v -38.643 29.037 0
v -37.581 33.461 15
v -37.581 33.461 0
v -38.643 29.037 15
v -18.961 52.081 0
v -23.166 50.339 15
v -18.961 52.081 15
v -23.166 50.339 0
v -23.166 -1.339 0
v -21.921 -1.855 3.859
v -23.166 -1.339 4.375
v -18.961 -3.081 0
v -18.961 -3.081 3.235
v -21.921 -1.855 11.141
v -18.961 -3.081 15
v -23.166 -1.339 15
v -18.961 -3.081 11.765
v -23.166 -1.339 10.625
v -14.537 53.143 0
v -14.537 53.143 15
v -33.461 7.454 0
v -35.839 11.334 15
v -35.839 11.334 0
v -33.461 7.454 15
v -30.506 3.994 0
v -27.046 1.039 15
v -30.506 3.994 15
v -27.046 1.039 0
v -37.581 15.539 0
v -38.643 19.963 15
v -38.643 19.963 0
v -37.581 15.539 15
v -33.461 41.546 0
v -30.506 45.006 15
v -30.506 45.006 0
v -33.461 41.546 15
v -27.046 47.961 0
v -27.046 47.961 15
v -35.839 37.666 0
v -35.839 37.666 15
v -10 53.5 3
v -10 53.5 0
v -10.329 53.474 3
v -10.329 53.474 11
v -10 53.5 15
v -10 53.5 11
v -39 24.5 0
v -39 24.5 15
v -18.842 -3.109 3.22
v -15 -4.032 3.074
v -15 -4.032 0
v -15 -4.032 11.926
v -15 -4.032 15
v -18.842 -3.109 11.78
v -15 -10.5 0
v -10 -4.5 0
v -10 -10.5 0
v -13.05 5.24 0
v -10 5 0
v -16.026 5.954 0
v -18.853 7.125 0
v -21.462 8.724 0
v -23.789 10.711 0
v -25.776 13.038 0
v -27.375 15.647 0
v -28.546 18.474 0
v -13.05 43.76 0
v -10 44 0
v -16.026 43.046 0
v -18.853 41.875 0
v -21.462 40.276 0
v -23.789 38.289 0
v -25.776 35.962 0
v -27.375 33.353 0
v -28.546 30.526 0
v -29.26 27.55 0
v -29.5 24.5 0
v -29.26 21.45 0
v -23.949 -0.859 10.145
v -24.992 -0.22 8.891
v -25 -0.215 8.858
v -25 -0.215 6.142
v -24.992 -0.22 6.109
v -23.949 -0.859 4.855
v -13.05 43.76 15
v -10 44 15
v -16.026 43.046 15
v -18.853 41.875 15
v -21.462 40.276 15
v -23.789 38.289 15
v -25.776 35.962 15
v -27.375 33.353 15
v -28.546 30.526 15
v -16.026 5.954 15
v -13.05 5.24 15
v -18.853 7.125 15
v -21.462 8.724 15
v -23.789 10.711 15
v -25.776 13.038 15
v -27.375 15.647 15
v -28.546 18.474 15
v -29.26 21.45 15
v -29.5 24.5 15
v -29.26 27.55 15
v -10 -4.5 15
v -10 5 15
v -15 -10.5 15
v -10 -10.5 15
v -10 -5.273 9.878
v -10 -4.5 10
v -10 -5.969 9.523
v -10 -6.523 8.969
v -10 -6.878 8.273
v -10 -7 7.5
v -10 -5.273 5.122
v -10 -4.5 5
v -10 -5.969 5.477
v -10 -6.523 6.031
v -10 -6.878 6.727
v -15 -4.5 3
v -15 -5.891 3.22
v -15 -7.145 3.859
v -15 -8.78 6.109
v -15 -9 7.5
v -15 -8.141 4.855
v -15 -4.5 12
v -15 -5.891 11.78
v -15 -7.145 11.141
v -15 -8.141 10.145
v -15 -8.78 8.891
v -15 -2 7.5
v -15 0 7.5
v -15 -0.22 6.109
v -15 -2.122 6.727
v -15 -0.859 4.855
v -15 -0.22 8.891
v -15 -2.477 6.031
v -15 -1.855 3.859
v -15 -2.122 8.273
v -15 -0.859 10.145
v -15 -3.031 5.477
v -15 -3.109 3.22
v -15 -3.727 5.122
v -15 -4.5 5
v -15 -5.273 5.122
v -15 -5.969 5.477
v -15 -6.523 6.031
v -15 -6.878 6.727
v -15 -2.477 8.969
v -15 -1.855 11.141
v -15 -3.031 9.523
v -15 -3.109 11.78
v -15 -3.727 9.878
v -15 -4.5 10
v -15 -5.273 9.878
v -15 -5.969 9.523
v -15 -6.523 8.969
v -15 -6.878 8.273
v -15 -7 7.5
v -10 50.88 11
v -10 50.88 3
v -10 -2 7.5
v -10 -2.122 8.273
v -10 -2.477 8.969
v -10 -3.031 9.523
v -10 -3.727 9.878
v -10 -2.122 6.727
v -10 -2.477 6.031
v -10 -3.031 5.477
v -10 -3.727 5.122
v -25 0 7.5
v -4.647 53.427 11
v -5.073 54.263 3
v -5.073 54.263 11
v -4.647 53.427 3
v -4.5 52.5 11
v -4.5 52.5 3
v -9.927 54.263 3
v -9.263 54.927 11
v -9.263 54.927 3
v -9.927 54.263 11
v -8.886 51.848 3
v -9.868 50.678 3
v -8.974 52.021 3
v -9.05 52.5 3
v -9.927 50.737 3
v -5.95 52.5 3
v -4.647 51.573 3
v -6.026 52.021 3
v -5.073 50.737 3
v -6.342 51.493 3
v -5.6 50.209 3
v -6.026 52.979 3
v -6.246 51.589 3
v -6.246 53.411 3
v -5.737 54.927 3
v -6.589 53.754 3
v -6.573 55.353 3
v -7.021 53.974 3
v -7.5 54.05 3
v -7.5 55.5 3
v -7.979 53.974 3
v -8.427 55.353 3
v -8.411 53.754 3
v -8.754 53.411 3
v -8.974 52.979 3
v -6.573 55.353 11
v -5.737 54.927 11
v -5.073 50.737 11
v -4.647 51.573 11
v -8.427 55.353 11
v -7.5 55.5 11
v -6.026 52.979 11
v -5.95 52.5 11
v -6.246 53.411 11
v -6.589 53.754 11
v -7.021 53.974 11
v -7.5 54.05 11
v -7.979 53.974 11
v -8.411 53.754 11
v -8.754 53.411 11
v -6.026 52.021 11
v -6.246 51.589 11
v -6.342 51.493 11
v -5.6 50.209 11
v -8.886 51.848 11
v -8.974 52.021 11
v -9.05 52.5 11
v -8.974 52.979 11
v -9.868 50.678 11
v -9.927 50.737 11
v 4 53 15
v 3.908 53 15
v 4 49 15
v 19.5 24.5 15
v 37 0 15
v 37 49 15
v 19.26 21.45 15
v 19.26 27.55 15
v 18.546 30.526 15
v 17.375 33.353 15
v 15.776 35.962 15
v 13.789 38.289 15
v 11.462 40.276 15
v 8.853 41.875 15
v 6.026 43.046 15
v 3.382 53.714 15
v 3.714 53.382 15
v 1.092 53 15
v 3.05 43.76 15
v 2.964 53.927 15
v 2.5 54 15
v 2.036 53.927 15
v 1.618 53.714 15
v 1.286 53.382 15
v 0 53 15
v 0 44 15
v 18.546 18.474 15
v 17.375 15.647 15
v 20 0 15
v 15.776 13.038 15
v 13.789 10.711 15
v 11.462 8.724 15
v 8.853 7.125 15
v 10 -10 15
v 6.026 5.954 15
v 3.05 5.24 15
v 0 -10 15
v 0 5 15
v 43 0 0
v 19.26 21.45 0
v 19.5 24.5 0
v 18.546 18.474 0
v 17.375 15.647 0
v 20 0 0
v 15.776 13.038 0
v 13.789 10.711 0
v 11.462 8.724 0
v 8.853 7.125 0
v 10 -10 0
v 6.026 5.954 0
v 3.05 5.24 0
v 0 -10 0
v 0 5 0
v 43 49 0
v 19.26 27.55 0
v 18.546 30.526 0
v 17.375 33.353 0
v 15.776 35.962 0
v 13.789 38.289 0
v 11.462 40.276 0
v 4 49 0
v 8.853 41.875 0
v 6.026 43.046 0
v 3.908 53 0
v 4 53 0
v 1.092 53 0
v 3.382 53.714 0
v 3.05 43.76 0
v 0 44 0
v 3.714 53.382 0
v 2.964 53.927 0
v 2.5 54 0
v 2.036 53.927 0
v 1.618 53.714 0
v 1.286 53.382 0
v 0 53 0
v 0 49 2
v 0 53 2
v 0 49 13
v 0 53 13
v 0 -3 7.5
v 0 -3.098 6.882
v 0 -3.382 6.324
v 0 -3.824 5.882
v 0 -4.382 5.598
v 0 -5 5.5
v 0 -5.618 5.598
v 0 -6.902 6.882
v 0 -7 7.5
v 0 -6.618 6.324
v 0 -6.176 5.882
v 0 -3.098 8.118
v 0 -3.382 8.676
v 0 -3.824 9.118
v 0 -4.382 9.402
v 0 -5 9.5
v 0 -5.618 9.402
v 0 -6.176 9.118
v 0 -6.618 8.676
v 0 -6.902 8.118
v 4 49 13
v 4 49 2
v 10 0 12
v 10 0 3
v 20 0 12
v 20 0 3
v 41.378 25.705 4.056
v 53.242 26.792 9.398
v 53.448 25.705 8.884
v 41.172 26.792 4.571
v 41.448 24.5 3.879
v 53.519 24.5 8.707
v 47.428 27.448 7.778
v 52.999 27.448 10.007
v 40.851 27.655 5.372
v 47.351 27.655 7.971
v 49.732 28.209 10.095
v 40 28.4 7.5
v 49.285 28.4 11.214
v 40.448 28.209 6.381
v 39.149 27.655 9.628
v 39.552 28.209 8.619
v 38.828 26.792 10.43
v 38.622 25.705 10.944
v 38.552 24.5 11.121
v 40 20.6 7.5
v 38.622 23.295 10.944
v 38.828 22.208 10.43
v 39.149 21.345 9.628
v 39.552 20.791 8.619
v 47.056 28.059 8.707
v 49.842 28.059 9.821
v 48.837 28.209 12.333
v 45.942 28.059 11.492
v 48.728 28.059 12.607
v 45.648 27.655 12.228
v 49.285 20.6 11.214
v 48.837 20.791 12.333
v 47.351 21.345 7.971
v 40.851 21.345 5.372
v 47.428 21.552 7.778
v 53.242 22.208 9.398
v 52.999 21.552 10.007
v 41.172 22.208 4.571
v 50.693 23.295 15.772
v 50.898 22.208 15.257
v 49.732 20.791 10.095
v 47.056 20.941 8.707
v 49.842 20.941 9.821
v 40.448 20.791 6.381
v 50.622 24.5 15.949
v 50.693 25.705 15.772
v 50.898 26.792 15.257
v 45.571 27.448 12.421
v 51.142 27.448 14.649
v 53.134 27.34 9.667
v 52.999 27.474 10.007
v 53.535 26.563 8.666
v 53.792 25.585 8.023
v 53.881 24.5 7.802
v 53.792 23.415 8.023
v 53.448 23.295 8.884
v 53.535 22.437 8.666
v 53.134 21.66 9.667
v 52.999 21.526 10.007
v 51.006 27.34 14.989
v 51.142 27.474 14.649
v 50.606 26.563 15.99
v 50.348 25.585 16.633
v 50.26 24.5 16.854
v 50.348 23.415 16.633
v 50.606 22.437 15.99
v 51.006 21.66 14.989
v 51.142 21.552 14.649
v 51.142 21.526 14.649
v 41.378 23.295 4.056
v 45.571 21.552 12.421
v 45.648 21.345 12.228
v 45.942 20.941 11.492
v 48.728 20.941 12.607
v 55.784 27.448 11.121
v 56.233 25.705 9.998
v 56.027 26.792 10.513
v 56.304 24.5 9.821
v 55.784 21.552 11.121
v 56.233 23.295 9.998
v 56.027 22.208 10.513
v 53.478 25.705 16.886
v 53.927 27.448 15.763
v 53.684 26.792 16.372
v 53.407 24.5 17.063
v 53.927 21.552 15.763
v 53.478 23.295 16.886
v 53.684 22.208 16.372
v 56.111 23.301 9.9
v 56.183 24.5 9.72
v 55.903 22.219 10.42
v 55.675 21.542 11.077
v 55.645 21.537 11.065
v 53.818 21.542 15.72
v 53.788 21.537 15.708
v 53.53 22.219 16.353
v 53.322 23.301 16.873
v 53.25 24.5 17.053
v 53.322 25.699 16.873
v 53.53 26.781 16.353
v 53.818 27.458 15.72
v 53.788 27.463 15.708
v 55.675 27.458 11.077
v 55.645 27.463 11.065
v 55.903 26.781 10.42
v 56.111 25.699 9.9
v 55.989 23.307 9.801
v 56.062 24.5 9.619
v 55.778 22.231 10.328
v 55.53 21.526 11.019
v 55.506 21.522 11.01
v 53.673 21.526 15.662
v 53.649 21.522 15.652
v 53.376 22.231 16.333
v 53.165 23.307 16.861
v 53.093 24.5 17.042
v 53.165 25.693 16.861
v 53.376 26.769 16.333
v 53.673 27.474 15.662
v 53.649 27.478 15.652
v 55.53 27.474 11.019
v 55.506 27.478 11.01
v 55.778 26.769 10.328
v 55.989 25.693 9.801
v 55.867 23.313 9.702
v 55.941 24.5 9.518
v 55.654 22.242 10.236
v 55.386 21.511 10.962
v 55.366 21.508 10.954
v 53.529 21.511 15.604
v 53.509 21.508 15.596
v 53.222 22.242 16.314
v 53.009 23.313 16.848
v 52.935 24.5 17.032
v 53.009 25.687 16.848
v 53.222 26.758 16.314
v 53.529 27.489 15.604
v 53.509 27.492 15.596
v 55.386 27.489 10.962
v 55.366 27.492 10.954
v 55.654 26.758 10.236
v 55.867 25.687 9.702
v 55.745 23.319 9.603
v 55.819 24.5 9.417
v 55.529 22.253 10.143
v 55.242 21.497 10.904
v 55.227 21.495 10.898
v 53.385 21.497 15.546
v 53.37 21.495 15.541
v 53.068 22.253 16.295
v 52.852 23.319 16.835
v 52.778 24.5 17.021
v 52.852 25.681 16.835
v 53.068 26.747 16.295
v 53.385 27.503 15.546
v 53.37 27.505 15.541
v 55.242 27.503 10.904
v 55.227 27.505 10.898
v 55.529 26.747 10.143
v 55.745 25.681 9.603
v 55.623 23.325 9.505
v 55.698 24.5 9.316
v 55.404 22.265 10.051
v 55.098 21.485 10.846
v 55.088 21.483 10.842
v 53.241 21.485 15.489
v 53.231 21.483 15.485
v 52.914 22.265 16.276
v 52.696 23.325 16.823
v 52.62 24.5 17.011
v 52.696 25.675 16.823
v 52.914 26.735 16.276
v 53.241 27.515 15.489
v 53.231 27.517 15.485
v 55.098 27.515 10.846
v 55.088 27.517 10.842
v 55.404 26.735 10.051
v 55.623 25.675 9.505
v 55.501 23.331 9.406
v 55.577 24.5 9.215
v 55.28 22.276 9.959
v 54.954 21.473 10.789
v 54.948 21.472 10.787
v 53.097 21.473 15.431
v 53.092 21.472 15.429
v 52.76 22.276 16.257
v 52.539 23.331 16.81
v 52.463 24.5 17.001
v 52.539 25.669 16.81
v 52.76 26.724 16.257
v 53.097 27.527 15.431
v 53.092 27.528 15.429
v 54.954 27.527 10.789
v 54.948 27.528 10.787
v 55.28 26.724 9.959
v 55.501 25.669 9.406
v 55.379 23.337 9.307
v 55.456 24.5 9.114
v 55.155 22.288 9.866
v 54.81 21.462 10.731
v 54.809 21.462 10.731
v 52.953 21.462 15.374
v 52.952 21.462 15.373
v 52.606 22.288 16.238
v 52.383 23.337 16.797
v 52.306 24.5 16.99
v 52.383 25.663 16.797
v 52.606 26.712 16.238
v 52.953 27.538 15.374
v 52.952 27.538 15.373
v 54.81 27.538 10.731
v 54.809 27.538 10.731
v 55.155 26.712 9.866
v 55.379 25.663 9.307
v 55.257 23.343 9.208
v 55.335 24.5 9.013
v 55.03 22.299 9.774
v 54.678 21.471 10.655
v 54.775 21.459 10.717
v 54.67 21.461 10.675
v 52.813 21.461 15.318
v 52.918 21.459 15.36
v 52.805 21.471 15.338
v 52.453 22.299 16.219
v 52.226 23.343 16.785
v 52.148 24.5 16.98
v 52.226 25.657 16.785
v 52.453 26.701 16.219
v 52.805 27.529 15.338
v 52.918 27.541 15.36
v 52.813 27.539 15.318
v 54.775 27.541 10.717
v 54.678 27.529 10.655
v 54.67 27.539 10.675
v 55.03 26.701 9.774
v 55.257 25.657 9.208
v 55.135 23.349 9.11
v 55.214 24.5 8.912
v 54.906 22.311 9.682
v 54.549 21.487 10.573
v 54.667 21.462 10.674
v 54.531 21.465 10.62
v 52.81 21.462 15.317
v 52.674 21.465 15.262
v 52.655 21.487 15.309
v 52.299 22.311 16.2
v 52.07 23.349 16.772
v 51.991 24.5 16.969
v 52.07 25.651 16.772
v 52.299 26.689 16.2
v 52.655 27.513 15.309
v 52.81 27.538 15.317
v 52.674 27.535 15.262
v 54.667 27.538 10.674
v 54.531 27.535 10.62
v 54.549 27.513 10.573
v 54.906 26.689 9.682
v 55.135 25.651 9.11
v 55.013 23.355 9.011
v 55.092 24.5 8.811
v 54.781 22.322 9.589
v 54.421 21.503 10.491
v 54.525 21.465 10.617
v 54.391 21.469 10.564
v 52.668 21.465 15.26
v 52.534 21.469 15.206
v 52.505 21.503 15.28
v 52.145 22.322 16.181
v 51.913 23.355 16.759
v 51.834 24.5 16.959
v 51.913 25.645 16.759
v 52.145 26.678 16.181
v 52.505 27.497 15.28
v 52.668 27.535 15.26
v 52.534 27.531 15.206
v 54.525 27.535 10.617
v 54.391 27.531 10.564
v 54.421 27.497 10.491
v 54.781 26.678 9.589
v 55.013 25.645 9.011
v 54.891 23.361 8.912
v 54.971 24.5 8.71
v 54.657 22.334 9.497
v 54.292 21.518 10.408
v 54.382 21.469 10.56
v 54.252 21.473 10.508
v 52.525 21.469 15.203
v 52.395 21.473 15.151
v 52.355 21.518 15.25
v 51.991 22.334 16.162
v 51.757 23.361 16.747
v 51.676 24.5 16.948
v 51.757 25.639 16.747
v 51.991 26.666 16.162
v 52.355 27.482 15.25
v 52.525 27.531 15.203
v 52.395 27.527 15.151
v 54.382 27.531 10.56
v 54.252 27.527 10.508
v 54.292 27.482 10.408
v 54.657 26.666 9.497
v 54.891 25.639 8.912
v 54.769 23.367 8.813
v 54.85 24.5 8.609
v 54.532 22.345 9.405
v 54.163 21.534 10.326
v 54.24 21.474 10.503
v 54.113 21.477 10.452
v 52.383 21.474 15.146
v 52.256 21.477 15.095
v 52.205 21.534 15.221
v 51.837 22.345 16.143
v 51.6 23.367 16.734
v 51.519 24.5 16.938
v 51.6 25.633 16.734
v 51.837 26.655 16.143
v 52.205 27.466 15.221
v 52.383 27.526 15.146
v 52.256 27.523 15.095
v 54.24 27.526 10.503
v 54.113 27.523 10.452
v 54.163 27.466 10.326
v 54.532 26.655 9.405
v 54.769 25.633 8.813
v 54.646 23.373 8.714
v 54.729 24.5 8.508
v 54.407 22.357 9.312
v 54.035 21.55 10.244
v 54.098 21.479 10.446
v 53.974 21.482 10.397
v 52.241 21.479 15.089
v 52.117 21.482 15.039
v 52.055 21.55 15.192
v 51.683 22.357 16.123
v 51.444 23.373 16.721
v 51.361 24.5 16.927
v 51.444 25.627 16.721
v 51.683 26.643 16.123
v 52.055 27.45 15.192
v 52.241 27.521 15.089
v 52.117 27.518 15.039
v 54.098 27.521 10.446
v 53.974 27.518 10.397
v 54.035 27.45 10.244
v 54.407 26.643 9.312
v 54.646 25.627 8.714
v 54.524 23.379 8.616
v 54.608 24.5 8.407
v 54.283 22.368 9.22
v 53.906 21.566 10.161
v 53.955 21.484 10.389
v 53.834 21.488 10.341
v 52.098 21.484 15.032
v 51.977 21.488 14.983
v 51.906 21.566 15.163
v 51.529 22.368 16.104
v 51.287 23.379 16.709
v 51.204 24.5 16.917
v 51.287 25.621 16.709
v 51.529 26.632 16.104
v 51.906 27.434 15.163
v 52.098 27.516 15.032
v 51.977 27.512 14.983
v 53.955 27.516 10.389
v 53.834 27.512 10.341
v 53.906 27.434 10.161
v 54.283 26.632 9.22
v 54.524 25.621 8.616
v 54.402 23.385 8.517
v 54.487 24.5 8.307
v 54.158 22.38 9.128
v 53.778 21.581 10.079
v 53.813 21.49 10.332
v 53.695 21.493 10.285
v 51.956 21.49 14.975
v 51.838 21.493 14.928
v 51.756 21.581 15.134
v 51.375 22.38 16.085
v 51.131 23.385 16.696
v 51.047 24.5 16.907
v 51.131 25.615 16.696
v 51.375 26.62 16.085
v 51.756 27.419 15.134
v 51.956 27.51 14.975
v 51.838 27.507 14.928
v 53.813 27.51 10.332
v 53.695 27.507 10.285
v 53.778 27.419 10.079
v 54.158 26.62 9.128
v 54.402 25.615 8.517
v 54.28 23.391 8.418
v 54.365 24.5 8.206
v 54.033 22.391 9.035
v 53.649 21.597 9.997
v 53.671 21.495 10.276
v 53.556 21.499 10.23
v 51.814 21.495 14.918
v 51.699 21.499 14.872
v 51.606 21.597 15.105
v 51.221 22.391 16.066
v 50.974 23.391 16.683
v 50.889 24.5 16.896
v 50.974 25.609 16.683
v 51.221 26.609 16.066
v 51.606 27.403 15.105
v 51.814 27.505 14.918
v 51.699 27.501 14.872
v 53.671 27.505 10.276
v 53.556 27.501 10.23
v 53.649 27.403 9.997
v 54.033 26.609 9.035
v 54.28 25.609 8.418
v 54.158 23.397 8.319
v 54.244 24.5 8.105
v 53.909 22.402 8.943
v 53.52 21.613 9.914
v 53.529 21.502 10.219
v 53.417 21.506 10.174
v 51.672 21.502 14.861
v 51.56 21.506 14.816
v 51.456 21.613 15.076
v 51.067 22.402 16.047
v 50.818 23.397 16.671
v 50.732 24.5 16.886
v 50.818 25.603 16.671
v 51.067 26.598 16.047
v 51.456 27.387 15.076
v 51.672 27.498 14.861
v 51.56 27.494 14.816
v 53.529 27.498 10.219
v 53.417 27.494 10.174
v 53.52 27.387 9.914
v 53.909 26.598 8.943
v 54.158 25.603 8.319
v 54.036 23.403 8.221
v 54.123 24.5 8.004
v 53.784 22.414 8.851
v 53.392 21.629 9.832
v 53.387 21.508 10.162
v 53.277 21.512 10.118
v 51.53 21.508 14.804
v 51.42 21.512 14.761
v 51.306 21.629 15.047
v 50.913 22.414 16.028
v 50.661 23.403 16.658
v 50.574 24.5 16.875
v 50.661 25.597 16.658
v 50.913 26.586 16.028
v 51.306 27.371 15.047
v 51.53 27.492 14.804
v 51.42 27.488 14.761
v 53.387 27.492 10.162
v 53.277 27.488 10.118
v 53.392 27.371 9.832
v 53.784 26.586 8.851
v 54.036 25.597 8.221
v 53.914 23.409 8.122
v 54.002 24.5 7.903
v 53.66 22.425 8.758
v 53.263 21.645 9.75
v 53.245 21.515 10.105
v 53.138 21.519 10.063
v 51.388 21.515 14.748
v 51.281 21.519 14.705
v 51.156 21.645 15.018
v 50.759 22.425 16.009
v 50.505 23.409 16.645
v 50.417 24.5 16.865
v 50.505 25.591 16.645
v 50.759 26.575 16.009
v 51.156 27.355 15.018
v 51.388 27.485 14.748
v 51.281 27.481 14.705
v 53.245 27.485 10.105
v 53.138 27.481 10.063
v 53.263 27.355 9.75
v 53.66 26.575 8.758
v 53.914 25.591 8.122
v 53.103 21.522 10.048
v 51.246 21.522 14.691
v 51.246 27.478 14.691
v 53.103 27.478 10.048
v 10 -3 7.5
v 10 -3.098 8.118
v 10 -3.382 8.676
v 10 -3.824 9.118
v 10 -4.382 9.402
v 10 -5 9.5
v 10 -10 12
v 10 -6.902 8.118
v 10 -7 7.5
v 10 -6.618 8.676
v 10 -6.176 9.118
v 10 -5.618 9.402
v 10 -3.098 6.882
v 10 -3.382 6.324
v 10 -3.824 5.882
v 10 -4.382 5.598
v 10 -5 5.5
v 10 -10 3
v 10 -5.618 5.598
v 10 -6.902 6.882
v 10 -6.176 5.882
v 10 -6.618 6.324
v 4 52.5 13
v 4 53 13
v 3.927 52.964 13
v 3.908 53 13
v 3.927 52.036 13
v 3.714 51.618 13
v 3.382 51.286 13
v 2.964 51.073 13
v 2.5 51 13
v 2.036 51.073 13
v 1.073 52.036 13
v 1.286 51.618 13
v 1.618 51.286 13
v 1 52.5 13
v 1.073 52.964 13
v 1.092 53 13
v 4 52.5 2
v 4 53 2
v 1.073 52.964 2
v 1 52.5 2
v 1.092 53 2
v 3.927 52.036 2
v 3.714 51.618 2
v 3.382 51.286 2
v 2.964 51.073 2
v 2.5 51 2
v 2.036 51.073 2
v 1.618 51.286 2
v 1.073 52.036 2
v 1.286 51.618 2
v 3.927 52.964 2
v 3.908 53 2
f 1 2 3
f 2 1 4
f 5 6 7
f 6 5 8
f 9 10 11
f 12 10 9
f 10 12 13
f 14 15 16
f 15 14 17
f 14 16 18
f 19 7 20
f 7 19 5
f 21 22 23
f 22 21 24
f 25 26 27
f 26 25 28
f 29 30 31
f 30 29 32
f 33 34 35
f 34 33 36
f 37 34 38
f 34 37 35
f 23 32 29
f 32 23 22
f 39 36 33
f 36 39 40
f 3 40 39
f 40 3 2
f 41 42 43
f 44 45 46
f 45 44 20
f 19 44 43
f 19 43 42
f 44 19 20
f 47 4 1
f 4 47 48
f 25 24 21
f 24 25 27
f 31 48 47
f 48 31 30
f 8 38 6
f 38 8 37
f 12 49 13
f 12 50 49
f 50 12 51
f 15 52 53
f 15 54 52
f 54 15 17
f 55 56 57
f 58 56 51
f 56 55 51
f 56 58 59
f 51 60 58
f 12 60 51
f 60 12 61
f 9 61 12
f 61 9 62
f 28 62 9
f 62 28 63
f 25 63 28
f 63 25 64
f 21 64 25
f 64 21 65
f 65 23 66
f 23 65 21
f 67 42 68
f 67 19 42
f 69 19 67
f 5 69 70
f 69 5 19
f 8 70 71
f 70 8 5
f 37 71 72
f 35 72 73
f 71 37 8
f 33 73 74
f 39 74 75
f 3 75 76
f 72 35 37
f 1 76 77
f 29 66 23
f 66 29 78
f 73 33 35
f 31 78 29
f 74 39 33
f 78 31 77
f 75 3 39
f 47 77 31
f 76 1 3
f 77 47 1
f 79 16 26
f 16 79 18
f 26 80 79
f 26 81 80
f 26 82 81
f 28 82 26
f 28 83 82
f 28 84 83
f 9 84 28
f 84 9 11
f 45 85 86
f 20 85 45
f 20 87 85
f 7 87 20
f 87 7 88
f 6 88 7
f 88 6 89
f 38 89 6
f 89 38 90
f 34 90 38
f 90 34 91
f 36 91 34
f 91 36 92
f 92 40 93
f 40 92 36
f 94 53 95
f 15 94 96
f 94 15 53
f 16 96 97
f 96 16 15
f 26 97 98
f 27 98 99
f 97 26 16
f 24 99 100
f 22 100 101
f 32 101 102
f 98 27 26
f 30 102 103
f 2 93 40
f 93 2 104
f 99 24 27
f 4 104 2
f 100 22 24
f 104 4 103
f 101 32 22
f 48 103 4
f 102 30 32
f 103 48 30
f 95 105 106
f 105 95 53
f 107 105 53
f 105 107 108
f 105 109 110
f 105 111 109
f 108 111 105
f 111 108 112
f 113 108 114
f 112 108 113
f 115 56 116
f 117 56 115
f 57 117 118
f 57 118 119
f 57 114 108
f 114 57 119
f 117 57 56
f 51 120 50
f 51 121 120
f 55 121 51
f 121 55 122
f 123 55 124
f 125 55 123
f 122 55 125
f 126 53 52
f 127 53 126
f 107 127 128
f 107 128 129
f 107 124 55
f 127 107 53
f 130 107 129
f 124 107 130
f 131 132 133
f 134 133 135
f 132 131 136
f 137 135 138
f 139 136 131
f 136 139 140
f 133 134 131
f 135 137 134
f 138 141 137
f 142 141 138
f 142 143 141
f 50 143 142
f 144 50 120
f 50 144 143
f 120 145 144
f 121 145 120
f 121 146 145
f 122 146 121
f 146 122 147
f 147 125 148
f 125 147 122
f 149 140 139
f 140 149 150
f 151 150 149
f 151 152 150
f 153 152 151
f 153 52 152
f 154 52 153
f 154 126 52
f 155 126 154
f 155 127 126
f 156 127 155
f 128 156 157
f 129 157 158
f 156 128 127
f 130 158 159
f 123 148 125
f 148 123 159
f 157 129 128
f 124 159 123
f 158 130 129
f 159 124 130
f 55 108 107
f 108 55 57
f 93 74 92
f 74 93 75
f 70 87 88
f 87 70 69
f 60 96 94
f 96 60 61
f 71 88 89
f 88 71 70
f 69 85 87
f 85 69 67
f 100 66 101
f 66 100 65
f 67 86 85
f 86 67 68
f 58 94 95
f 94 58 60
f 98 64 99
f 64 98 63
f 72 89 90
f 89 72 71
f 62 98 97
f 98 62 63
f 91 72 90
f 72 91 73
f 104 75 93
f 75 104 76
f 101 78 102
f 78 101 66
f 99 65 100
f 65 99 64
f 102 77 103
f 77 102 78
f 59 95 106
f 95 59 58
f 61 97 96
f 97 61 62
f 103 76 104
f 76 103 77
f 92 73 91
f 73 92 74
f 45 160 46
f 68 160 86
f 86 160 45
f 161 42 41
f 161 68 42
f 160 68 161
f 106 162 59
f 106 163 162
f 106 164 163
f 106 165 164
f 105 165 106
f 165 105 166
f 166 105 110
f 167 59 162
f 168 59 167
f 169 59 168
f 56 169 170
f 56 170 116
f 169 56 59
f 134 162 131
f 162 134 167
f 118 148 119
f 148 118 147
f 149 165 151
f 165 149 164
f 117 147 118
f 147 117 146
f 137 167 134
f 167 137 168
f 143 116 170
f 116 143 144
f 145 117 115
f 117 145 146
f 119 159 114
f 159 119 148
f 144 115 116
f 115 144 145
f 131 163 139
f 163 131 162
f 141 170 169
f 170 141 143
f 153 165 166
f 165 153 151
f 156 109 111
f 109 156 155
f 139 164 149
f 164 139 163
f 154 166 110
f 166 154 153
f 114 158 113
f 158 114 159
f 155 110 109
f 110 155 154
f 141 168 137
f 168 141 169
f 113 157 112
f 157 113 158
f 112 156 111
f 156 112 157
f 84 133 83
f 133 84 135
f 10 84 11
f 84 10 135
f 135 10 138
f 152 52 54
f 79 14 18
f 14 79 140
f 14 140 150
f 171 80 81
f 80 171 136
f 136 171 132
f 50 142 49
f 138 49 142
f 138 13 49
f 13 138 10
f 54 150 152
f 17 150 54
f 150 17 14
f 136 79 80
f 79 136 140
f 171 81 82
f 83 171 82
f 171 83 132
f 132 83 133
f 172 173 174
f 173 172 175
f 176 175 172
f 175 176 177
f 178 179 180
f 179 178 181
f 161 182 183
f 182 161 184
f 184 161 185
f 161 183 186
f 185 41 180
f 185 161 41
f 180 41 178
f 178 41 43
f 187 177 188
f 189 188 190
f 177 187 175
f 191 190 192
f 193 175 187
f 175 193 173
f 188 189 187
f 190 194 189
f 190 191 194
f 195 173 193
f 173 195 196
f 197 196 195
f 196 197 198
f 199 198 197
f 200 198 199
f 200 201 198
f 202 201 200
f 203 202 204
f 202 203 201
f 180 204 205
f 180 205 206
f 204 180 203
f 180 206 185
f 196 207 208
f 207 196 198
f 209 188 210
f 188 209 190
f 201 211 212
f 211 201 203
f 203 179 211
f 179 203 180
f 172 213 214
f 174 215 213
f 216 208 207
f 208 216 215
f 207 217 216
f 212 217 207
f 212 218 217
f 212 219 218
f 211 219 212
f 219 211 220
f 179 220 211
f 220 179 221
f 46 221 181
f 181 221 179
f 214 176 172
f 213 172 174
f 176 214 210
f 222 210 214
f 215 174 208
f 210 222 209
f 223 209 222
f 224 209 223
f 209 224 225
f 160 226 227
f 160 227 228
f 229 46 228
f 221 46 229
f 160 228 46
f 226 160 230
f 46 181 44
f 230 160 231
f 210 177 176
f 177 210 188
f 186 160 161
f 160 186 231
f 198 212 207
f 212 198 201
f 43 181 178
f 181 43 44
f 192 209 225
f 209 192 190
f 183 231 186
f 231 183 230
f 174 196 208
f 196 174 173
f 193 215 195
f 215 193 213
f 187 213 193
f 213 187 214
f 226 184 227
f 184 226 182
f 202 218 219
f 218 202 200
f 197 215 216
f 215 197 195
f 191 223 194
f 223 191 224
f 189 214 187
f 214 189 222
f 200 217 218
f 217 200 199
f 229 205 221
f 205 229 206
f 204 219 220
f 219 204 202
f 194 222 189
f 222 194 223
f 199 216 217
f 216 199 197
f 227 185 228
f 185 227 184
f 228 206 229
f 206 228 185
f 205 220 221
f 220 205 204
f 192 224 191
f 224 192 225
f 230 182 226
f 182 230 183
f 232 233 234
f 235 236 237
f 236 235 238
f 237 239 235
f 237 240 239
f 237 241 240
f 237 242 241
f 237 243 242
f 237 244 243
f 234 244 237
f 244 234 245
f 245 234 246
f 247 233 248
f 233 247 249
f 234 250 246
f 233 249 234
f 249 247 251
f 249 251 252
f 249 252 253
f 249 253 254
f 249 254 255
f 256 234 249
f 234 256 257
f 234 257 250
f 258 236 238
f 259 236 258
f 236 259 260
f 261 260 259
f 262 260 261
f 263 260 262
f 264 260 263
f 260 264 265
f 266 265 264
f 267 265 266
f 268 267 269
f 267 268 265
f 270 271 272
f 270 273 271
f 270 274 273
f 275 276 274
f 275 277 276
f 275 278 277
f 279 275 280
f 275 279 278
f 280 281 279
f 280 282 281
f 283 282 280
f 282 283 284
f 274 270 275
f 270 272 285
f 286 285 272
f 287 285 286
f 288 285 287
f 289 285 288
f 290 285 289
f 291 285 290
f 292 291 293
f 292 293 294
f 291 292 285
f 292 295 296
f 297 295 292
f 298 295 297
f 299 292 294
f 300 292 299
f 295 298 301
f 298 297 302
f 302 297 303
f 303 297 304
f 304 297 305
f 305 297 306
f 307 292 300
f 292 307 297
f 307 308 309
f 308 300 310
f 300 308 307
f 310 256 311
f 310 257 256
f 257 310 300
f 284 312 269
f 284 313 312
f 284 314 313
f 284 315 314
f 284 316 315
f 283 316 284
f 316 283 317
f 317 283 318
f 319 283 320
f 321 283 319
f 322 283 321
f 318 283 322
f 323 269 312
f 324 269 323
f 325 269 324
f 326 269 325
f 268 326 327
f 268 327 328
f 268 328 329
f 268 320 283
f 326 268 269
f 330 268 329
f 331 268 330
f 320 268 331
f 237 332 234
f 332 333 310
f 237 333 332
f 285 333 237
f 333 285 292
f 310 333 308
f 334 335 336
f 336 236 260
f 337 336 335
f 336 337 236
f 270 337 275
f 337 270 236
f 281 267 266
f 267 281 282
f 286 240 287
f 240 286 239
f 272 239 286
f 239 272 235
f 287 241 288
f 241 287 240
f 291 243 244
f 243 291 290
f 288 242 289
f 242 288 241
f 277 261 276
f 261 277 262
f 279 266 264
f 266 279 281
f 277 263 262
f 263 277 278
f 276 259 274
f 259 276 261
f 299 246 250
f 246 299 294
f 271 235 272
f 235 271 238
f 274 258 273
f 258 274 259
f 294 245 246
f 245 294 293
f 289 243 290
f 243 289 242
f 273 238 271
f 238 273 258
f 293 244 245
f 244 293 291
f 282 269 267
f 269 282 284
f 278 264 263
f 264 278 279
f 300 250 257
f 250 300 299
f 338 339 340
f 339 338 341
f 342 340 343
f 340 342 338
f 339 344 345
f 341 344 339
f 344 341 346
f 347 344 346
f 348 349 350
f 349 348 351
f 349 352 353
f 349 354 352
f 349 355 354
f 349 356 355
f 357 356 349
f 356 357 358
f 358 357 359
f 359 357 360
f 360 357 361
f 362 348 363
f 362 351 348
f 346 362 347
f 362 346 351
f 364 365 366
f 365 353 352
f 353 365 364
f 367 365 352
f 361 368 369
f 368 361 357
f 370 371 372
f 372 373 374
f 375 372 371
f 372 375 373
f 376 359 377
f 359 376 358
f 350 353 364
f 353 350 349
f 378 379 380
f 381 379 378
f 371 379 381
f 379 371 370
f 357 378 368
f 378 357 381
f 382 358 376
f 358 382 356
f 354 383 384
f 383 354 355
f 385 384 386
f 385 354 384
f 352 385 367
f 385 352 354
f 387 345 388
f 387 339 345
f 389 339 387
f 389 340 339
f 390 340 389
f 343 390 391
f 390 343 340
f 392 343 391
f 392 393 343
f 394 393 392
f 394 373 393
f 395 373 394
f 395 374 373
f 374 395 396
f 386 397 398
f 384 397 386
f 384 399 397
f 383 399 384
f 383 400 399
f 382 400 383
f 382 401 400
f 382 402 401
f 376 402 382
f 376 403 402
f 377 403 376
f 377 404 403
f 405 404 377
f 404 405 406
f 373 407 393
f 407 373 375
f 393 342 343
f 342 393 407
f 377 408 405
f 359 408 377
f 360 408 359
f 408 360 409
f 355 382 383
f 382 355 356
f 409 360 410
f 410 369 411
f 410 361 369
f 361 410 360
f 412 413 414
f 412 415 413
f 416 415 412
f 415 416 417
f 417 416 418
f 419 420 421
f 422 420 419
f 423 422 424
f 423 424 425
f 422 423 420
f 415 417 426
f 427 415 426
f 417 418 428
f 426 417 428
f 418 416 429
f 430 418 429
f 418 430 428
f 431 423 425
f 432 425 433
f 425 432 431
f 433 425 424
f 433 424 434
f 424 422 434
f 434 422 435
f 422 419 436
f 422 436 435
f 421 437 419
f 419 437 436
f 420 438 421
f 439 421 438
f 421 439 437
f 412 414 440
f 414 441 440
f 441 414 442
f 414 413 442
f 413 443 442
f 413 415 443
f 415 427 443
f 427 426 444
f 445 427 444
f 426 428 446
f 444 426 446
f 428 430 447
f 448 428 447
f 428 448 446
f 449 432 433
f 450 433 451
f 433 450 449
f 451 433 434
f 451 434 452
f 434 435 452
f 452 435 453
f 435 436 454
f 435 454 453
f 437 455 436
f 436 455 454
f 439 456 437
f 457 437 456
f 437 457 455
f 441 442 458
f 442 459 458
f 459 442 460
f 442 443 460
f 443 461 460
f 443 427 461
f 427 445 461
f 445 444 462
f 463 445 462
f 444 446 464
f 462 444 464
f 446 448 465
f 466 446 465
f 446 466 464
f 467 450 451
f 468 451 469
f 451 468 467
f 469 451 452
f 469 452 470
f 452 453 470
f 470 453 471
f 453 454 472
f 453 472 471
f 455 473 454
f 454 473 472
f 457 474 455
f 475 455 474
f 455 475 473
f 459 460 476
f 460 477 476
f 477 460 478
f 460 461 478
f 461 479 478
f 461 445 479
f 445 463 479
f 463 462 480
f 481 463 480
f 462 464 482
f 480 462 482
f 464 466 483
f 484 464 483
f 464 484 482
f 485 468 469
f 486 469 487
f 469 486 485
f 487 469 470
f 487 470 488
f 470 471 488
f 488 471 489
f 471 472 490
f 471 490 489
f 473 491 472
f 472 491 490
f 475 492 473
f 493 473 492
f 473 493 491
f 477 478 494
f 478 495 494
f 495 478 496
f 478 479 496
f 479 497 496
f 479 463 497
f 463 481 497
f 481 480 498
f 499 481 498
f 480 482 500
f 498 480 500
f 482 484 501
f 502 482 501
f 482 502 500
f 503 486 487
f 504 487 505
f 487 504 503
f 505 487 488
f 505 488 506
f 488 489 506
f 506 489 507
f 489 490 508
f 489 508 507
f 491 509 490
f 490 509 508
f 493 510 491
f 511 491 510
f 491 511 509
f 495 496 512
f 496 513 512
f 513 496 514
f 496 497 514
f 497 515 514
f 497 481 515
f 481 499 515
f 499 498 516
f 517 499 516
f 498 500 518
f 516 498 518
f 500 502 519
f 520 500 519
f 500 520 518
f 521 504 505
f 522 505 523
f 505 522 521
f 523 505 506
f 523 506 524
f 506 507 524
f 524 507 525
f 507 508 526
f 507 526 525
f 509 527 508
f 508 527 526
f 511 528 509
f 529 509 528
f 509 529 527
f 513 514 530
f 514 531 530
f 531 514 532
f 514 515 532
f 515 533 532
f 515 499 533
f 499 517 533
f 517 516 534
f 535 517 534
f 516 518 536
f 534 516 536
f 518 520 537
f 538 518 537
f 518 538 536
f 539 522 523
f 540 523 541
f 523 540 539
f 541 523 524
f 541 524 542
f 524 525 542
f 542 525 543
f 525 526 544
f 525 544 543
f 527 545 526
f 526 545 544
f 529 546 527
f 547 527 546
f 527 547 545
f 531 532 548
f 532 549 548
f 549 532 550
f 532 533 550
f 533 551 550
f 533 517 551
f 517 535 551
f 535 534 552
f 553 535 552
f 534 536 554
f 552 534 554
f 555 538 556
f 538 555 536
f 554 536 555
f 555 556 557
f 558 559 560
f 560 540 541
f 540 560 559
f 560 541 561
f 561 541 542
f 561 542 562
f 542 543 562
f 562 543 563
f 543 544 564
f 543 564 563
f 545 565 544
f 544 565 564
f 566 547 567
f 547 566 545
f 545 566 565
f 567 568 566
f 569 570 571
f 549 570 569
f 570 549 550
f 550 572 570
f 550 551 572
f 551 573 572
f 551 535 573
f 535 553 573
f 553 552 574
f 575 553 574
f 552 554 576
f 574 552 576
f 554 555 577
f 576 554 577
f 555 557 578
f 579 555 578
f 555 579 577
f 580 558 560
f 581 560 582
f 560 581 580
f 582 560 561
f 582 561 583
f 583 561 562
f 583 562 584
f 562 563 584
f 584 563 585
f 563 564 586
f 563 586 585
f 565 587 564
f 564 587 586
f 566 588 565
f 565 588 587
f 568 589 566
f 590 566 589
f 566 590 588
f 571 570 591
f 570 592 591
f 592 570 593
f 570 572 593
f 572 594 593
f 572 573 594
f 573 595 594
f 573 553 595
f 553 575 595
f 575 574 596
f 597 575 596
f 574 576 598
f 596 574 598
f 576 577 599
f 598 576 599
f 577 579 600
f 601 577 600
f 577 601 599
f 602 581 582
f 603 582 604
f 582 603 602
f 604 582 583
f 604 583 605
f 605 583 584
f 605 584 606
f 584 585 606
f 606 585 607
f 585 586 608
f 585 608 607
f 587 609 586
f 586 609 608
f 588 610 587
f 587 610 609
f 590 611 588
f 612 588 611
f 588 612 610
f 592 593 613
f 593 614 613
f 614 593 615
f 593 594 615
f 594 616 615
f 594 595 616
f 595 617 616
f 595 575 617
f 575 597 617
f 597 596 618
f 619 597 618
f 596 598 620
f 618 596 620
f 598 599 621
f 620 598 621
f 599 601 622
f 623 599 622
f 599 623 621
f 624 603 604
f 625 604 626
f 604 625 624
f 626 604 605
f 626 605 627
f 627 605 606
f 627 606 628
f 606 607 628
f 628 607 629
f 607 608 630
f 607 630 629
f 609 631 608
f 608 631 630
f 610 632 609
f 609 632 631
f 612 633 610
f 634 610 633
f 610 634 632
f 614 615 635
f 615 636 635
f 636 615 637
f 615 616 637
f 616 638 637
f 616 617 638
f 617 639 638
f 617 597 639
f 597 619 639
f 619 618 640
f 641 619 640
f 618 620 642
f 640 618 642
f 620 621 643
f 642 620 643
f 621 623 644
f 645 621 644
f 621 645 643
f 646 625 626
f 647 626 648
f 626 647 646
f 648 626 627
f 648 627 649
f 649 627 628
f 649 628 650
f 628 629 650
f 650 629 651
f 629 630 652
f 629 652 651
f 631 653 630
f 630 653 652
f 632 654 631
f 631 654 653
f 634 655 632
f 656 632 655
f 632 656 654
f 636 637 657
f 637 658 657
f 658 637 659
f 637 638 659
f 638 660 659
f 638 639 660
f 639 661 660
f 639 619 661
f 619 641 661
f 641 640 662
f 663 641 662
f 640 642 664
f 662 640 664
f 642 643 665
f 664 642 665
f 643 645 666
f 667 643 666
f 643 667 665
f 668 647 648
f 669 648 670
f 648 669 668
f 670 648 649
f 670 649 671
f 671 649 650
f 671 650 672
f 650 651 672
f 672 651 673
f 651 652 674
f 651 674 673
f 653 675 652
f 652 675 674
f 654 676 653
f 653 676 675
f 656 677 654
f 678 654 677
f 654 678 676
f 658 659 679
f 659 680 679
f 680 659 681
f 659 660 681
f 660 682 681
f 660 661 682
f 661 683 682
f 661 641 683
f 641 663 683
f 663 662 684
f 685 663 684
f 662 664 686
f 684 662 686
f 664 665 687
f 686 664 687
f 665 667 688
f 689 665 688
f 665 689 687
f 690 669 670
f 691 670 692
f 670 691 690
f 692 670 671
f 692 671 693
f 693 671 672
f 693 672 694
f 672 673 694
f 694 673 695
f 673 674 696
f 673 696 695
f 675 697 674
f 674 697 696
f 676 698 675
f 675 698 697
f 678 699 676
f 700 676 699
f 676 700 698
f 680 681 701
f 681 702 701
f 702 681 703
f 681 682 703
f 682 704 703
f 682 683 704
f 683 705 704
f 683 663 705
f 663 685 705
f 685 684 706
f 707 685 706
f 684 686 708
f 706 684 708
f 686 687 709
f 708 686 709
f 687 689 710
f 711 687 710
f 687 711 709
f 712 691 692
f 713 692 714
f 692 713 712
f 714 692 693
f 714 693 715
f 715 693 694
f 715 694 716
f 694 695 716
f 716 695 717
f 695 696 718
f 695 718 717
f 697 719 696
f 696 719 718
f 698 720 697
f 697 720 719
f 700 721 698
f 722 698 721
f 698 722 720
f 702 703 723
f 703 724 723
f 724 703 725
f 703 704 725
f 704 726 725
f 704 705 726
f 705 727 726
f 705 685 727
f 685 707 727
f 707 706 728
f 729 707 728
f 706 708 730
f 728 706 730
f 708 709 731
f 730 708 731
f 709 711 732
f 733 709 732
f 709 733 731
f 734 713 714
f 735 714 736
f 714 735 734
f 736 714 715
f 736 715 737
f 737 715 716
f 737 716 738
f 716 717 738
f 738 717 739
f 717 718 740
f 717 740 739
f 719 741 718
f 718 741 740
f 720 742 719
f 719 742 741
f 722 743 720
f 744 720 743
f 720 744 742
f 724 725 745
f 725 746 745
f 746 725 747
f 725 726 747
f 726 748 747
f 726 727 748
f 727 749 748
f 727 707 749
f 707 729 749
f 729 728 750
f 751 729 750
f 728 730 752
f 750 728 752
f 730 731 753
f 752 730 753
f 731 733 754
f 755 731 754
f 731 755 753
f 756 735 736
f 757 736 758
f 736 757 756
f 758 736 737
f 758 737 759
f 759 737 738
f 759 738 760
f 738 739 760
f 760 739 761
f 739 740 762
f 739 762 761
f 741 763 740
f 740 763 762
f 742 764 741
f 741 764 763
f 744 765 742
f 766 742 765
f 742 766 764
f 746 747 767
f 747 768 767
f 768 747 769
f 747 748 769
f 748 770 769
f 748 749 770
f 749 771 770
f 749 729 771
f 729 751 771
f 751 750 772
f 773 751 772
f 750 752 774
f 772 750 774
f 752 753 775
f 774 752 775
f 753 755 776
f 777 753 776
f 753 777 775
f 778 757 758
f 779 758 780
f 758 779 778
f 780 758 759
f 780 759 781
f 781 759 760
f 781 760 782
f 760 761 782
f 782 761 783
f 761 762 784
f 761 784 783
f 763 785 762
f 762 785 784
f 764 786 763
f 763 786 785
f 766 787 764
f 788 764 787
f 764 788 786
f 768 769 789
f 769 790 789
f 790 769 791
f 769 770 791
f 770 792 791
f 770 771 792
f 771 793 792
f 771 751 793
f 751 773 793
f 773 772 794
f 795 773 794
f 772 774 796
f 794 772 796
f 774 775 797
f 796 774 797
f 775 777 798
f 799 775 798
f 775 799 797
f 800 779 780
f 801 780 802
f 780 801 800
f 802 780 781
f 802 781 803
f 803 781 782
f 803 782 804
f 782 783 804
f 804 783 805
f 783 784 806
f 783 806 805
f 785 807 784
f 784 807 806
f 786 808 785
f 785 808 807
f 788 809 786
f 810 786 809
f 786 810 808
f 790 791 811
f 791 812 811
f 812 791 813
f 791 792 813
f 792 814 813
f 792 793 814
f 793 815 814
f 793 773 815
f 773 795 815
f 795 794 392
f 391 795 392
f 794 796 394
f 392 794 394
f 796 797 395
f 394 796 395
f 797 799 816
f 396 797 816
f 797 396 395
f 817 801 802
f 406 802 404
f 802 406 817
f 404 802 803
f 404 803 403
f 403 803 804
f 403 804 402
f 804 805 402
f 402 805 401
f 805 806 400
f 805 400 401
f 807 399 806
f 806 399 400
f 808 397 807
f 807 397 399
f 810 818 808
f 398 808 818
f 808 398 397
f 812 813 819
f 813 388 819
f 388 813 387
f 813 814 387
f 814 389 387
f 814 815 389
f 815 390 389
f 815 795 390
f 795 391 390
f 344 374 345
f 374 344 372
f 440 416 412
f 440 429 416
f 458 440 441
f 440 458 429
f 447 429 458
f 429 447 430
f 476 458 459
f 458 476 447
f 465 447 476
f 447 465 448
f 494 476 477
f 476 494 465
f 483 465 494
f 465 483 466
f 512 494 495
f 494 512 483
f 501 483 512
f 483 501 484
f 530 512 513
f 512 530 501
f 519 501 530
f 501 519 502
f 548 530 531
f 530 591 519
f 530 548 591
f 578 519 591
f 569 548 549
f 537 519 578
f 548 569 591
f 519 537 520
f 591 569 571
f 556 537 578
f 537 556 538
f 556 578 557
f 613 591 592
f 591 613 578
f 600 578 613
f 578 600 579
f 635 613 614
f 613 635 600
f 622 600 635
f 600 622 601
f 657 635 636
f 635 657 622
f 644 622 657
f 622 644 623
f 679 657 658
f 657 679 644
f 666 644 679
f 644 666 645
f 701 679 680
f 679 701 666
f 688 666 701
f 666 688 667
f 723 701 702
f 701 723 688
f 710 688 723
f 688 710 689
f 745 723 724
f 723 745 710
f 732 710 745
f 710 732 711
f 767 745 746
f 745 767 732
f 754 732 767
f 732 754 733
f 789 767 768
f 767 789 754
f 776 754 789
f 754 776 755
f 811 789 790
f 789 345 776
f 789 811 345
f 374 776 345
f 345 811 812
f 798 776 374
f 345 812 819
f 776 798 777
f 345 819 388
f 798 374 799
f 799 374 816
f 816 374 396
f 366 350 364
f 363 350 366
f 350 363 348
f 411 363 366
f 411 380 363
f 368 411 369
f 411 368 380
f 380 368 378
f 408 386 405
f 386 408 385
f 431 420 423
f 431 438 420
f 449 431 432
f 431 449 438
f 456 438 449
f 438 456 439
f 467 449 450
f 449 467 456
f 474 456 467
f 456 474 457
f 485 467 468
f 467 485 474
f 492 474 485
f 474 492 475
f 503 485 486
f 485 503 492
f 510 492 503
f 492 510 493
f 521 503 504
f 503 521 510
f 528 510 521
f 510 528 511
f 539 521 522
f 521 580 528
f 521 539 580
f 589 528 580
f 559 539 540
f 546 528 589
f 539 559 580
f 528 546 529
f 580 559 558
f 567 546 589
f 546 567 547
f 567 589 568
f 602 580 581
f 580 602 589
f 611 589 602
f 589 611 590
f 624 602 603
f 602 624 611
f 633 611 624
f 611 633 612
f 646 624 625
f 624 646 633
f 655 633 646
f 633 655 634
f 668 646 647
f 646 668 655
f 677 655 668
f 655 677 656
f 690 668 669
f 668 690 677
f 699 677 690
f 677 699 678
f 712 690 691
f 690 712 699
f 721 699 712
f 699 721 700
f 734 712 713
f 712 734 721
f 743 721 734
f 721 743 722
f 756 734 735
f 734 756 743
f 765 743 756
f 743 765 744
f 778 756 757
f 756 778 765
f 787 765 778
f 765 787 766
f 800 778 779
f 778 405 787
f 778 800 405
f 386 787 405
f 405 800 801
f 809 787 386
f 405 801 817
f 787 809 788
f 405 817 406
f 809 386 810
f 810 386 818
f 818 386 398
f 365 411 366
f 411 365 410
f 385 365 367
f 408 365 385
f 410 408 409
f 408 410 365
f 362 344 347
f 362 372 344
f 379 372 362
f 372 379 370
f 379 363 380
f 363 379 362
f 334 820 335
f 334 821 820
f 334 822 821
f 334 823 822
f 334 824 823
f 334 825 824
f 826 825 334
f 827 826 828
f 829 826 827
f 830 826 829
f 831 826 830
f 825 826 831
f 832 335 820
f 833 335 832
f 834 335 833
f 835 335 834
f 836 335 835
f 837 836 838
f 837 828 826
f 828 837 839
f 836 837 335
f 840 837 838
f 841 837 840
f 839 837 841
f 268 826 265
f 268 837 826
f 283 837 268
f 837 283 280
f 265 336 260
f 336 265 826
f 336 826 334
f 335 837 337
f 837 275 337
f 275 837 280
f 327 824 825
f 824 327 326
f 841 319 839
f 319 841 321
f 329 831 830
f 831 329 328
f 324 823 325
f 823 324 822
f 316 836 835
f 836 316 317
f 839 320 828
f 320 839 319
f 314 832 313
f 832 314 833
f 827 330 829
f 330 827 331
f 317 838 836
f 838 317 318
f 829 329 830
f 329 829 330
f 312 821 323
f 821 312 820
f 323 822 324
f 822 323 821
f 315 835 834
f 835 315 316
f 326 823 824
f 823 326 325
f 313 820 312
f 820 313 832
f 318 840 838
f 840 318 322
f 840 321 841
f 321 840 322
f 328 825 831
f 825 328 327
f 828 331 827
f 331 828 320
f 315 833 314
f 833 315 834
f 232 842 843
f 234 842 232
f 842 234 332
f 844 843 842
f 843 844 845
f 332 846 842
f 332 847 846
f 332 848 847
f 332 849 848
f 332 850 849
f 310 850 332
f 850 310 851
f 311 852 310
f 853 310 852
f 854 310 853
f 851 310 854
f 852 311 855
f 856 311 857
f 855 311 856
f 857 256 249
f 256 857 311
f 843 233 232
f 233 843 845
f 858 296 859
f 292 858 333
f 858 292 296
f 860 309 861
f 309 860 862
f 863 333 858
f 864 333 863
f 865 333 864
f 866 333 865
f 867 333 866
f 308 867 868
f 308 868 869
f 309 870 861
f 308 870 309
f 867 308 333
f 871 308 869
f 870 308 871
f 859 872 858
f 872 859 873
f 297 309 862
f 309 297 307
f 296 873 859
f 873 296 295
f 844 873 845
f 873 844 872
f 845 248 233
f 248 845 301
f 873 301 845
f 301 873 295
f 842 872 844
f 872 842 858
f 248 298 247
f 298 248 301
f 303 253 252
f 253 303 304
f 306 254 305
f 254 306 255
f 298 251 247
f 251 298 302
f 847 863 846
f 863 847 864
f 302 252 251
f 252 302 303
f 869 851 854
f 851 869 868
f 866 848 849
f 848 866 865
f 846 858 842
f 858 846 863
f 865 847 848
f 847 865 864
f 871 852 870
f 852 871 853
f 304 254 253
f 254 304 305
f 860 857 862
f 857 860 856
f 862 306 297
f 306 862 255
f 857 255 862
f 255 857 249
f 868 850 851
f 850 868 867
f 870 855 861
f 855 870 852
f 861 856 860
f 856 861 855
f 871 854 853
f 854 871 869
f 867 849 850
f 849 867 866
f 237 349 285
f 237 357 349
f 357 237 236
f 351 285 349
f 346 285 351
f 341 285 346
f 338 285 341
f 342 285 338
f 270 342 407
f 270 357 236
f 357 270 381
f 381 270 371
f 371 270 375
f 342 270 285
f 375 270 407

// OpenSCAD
// file: Triangles.scad
/*
Triangles.scad
 Author: Tim Koopman
 https://github.com/tkoopman/Delta-Diamond/blob/master/OpenSCAD/Triangles.scad

         angleCA
           /|\
        a / H \ c
         /  |  \
 angleAB ------- angleBC
            b

Standard Parameters
	center: true/false
		If true same as centerXYZ = [true, true, true]

	centerXYZ: Vector of 3 true/false values [CenterX, CenterY, CenterZ]
		center must be left undef

	height: The 3D height of the Triangle. Ignored if heights defined

	heights: Vector of 3 height values heights @ [angleAB, angleBC, angleCA]
		If CenterZ is true each height will be centered individually, this means
		the shape will be different depending on CenterZ. Most times you will want
		CenterZ to be true to get the shape most people want.
*/

/* 
Triangle
	a: Length of side a
	b: Length of side b
	angle: angle at point angleAB
*/
module Triangle(
			a, b, angle, height=1, heights=undef,
			center=undef, centerXYZ=[false,false,false])
{
	// Calculate Heights at each point
	heightAB = ((heights==undef) ? height : heights[0])/2;
	heightBC = ((heights==undef) ? height : heights[1])/2;
	heightCA = ((heights==undef) ? height : heights[2])/2;
	centerZ = (center || (center==undef && centerXYZ[2]))?0:max(heightAB,heightBC,heightCA);

	// Calculate Offsets for centering
	offsetX = (center || (center==undef && centerXYZ[0]))?((cos(angle)*a)+b)/3:0;
	offsetY = (center || (center==undef && centerXYZ[1]))?(sin(angle)*a)/3:0;
	
	pointAB1 = [-offsetX,-offsetY, centerZ-heightAB];
	pointAB2 = [-offsetX,-offsetY, centerZ+heightAB];
	pointBC1 = [b-offsetX,-offsetY, centerZ-heightBC];
	pointBC2 = [b-offsetX,-offsetY, centerZ+heightBC];
	pointCA1 = [(cos(angle)*a)-offsetX,(sin(angle)*a)-offsetY, centerZ-heightCA];
	pointCA2 = [(cos(angle)*a)-offsetX,(sin(angle)*a)-offsetY, centerZ+heightCA];

	polyhedron(
		points=[	pointAB1, pointBC1, pointCA1,
					pointAB2, pointBC2, pointCA2 ],
		triangles=[	
			[0, 1, 2],
			[3, 5, 4],
			[0, 3, 1],
			[1, 3, 4],
			[1, 4, 2],
			[2, 4, 5],
			[2, 5, 0],
			[0, 5, 3] ] );
}

/*
Isosceles Triangle
	Exactly 2 of the following paramaters must be defined.
	If all 3 defined H will be ignored.
	b: length of side b
	angle: angle at points angleAB & angleBC.
*/
module Isosceles_Triangle(
			b, angle, H=undef, height=1, heights=undef,
			center=undef, centerXYZ=[true, false, false])
{
	valid = 	(angle!=undef)?((angle < 90) && (b!=undef||H!=undef)) : (b!=undef&&H!=undef);
	ANGLE = (angle!=undef) ? angle : atan(H / (b/2));
	a = (b==undef)?(H/sin((180-(angle*2))/2)) : 
		 (b / cos(ANGLE))/2;
	B = (b==undef)? (cos(angle)*a)*2:b;
	if (valid)
	{
		Triangle(a=a, b=B, angle=ANGLE, height=height, heights=heights,
					center=center, centerXYZ=centerXYZ);
	} else {
		echo("Invalid Isosceles_Triangle. Must specify any 2 of b, angle and H, and if angle used angle must be less than 90");
	}
}

/*
Right Angled Triangle
	Create a Right Angled Triangle where the hypotenuse will be calculated.

       |\
      a| \
       |  \
       ----
         b
	a: length of side a
	b: length of side b
*/
module Right_Angled_Triangle(
			a, b, height=1, heights=undef,
			center=undef, centerXYZ=[false, false, false])
{
	Triangle(a=a, b=b, angle=90, height=height, heights=heights,
				center=center, centerXYZ=centerXYZ);
}

/*
Wedge
	Is same as Right Angled Triangle with 2 different heights, and rotated.
	Good for creating support structures.
*/
module Wedge(a, b, w1, w2)
{
	rotate([90,0,0])
		Right_Angled_Triangle(a, b, heights=[w1, w2, w1], centerXYZ=[false, false, true]);
}

/*
Equilateral Triangle
	Create a Equilateral Triangle.

	l: Length of all sides (a, b & c)
	H: Triangle size will be based on the this 2D height
		When using H, l is ignored.
*/
module Equilateral_Triangle(
			l=10, H=undef, height=1, heights=undef,
			center=undef, centerXYZ=[true,false,false])
{
	L = (H==undef)?l:H/sin(60);
	Triangle(a=L,b=L,angle=60,height=height, heights=heights,
				center=center, centerXYZ=centerXYZ);
}

/*
Trapezoid
	Create a Basic Trapezoid (Based on Isosceles_Triangle)

            d
          /----\
         /  |   \
     a  /   H    \ c
       /    |     \
 angle ------------ angle
            b

	b: Length of side b
	angle: Angle at points angleAB & angleBC
	H: The 2D height at which the triangle should be cut to create the trapezoid
	heights: If vector of size 3 (Standard for triangles) both cd & da will be the same height, if vector have 4 values [ab,bc,cd,da] than each point can have different heights.
*/
module Trapezoid(
			b, angle=60, H, height=1, heights=undef,
			center=undef, centerXYZ=[true,false,false])
{
	validAngle = (angle < 90);
	adX = H / tan(angle);

	// Calculate Heights at each point
	heightAB = ((heights==undef) ? height : heights[0])/2;
	heightBC = ((heights==undef) ? height : heights[1])/2;
	heightCD = ((heights==undef) ? height : heights[2])/2;
	heightDA = ((heights==undef) ? height : ((len(heights) > 3)?heights[3]:heights[2]))/2;

	// Centers
	centerX = (center || (center==undef && centerXYZ[0]))?0:b/2;
	centerY = (center || (center==undef && centerXYZ[1]))?0:H/2;
	centerZ = (center || (center==undef && centerXYZ[2]))?0:max(heightAB,heightBC,heightCD,heightDA);

	// Points
	y = H/2;
	bx = b/2;
	dx = (b-(adX*2))/2;

	pointAB1 = [centerX-bx, centerY-y, centerZ-heightAB];
	pointAB2 = [centerX-bx, centerY-y, centerZ+heightAB];
	pointBC1 = [centerX+bx, centerY-y, centerZ-heightBC];
	pointBC2 = [centerX+bx, centerY-y, centerZ+heightBC];
	pointCD1 = [centerX+dx, centerY+y, centerZ-heightCD];
	pointCD2 = [centerX+dx, centerY+y, centerZ+heightCD];
	pointDA1 = [centerX-dx, centerY+y, centerZ-heightDA];
	pointDA2 = [centerX-dx, centerY+y, centerZ+heightDA];

	validH = (adX < b/2);

	if (validAngle && validH)
	{
		polyhedron(
			points=[	pointAB1, pointBC1, pointCD1, pointDA1,
						pointAB2, pointBC2, pointCD2, pointDA2 ],
			triangles=[	
				[0, 1, 2],
				[0, 2, 3],
				[4, 6, 5],
				[4, 7, 6],
				[0, 4, 1],
				[1, 4, 5],
				[1, 5, 2],
				[2, 5, 6],
				[2, 6, 3],
				[3, 6, 7],
				[3, 7, 0],
				[0, 7, 4]	] );
	} else {
		if (!validAngle) echo("Trapezoid invalid, angle must be less than 90");
		else echo("Trapezoid invalid, H is larger than triangle");
	}
}


// Examples
Triangle(a=5, b=15, angle=33, centerXYZ=[true,false,false]);
translate([20,0,0]) Right_Angled_Triangle(a=5, b=20, centerXYZ=[false,true,false]);
translate([45,0,0]) Wedge(a=5, b=20, w1=10, w2=5);
translate([-20,0,0]) Trapezoid(b=20, angle=33, H=4, height=5, centerXYZ=[true,false,true]);

translate([0,10,0]) Isosceles_Triangle(b=20, angle=33);
translate([30,10,0]) Isosceles_Triangle(b=20, H=5);
translate([-30,10,0]) Isosceles_Triangle(angle=33, H=5, center=true);

translate([15,-25,0]) Equilateral_Triangle(l=20);
translate([-15,-25,0]) Equilateral_Triangle(H=20);
// main file
use <Triangles.scad>;

// May need to be increased to 2.5 for soft filaments
screw_r = 2;
$fn = 20;

module t90_pin() {
    difference() {
        union() {
            cylinder(h=13, r1=3.9, r2=3.9, center=false);
            translate([0, 0, 16])
            rotate([180,0,0])
                    linear_extrude(height=3, center=false, scale=[1.25,0.9])
                        circle(r=3.9);
        }
        translate([-2.5, -6, 10])
            cube([5, 12, 8], center=false);

        translate([-2.5, -4, 7])
            cube([1, 8, 3], center=false);
        translate([1.5, -4, 7])
            cube([1, 8, 3], center=false);
    }
}

module t90_top() {
    difference() {
        union() {
            // main body
            cylinder(h=15, r1=29, r2=29, $fn=40);
            
            // where the screw is
            translate([-5, -29-6, 0])
                cube([5, 15, 15]);
        };
        
        cylinder(h=15, r1=39/2, r2=39/2, $fn=40);
        translate([0, -29, 0])
            cube([29, 29*2, 15]);
        
        // screw hole
        translate([-10, -29, 15/2])
            rotate([0, 90, 0])
            cylinder(h=20, r1=2.5, r2=2.5);
        
        // screw cap hole
        translate([-15, -29, 15/2])
            rotate([0, 90, 0])
            cylinder(h=10, r1=4.5, r2=4.5);
    }
    
    // turning point
    difference() {
        //translate([-4, 25, 3])
        //    cube([10, 7, 8]);
        translate([2.5, 28, 3])
            cylinder(h=8, r1=3, r2=3);
        
        translate([2.5, 28, 3])
            cylinder(h=8, r1=1.55, r2=1.55);
        
        translate([2.5, 29, 3])
            rotate([0, 0, -130])
            Triangle(5, 5, angle=70, height=8);
        
    };
    
}

module t90_bottom() {

    // Slanted edge
    translate([37, 49, 0])
    rotate([-90,180,180])
        Triangle(15, 6, angle=90, height=49);

    // Main body
    difference() {
        cube([37, 49, 15]);
        translate([0, 49/2, 0])
        cylinder(h=15, r1=39/2, r2=39/2, $fn = 40);

    }

    // Pin attaching the main body to the slider
    translate([37+3, 49/2, 15/2])
        rotate([0, 68.199, 0])
        t90_pin();

    // screw hole
    difference() {
        union() {
            translate([0, -10, 0])
                cube([10, 10, 15]);
            
            translate([10, 0, 15])
                rotate([180,0,0])
                Triangle(10, 10, angle=90, height=3);
            
            translate([10, 0, 3])
                rotate([180,0,0])
                Triangle(10, 10, angle=90, height=3);
        };
            
        rotate([0, 90, 0])
            translate([-15/2, -5, 0])
            cylinder(h=11, r1 = screw_r, r2 = screw_r);
    }

    // turning point
    union() {
        translate([1.5+1, 49+1.5+2, 0])
            cylinder(h=15, r1=1.5, r2=1.5);
        
        for(z = [15 - 2, 0])
            translate([0, 49, z])
                cube([4, 4, 2]);
    }
}

translate([-10, 29-4.5, 0])
    t90_top();

t90_bottom();
